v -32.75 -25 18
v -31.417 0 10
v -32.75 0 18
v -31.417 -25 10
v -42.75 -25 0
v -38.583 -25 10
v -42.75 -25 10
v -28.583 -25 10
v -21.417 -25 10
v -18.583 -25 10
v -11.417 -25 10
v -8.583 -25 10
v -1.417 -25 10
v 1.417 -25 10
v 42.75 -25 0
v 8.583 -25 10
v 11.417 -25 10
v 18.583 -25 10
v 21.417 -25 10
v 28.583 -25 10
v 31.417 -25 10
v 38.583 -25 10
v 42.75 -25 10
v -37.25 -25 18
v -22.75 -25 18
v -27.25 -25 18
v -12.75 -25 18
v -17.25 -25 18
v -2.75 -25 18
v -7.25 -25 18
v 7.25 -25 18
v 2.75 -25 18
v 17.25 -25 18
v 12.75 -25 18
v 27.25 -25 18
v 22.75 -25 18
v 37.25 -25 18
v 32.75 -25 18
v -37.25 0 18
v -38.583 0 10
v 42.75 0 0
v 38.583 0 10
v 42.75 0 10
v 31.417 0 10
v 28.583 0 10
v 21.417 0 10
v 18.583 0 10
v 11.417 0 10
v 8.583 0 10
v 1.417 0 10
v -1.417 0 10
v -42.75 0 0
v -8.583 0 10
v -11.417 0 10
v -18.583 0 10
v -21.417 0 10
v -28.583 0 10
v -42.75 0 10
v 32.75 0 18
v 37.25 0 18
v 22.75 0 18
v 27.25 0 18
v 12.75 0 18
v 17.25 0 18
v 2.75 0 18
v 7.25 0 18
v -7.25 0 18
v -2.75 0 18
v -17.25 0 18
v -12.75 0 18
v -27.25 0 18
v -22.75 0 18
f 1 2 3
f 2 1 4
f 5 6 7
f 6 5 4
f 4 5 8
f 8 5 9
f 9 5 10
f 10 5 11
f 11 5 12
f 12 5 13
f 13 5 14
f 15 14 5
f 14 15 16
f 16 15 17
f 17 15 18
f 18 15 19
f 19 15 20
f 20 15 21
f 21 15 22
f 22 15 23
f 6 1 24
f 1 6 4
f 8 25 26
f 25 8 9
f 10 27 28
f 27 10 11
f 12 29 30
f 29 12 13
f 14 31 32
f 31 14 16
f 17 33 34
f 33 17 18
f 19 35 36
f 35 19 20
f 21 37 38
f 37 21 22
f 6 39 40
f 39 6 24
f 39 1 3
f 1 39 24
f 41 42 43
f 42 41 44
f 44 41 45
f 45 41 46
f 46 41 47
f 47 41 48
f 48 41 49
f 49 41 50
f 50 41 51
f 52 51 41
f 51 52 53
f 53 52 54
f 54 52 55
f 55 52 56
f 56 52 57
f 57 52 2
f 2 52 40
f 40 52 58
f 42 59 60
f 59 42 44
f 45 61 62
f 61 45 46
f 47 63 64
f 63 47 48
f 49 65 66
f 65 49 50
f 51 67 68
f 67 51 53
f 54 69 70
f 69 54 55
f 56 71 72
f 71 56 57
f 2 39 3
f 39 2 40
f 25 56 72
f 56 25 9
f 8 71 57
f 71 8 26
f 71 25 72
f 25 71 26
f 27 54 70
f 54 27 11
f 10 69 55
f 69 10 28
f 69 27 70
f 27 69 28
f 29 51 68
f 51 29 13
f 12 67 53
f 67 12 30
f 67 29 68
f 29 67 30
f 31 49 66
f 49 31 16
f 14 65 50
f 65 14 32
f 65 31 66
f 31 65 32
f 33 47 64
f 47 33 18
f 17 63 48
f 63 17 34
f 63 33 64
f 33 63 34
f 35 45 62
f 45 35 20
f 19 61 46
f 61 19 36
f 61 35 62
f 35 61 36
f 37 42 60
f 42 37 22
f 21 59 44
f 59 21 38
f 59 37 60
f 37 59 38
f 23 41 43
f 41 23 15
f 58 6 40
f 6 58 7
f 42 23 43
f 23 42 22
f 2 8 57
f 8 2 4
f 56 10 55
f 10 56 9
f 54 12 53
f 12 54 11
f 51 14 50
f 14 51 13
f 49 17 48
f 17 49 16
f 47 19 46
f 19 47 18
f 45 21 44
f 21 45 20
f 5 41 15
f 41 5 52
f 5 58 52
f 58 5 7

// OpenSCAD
$fn = 32;

// ----------------------------------------------------------------------
// Toothed rack, 8 teeth
// 10 mm pitch, 8 mm teeth
// ----------------------------------------------------------------------

// --- parameters (mm) ---
bar_w = 25;     // bar width (Y)
bar_h = 10;     // bar height (Z)
teeth = 8;      // number of teeth
pitch = 10;     // tooth pitch
tooth_h = 8;    // tooth height above the bar
root_w = 7.5;   // tooth width at the root
crest_w = 4.5;  // tooth width at the crest

// --- derived feature positions (mm) ---
span = (teeth - 1) * pitch;  // = 70   distance between the outer teeth
bar_l = span + root_w + 8;   // = 85.5   bar length: teeth plus 4 mm at each end
tooth_x = -span / 2;         // = -35   X of the first tooth
height = bar_h + tooth_h;    // = 18   overall height
feature_centers = [
  [tooth_x + 0 * pitch, -bar_w / 2],
  [tooth_x + 1 * pitch, -bar_w / 2],
  [tooth_x + 2 * pitch, -bar_w / 2],
  [tooth_x + 3 * pitch, -bar_w / 2],
  [tooth_x + 4 * pitch, -bar_w / 2],
  [tooth_x + 5 * pitch, -bar_w / 2],
  [tooth_x + 6 * pitch, -bar_w / 2],
  [tooth_x + 7 * pitch, -bar_w / 2]
];   // tooth centre line, drives the tooth loop

// bar with a rack of teeth, one extruded trapezoium per centre
module rack_tooth() {
  linear_extrude(height = bar_w)
    polygon(points = [
      [0, 0],
      [root_w, 0],
      [root_w / 2 + crest_w / 2, tooth_h + 1],
      [root_w / 2 - crest_w / 2, tooth_h + 1]
    ]);
}

union() {
  translate([-bar_l / 2, -bar_w, 0]) cube([bar_l, bar_w, bar_h]);
  for (centre = feature_centers)
    translate([centre[0] - root_w / 2, 0, bar_h - 1]) rotate([90, 0, 0]) rack_tooth();
}
